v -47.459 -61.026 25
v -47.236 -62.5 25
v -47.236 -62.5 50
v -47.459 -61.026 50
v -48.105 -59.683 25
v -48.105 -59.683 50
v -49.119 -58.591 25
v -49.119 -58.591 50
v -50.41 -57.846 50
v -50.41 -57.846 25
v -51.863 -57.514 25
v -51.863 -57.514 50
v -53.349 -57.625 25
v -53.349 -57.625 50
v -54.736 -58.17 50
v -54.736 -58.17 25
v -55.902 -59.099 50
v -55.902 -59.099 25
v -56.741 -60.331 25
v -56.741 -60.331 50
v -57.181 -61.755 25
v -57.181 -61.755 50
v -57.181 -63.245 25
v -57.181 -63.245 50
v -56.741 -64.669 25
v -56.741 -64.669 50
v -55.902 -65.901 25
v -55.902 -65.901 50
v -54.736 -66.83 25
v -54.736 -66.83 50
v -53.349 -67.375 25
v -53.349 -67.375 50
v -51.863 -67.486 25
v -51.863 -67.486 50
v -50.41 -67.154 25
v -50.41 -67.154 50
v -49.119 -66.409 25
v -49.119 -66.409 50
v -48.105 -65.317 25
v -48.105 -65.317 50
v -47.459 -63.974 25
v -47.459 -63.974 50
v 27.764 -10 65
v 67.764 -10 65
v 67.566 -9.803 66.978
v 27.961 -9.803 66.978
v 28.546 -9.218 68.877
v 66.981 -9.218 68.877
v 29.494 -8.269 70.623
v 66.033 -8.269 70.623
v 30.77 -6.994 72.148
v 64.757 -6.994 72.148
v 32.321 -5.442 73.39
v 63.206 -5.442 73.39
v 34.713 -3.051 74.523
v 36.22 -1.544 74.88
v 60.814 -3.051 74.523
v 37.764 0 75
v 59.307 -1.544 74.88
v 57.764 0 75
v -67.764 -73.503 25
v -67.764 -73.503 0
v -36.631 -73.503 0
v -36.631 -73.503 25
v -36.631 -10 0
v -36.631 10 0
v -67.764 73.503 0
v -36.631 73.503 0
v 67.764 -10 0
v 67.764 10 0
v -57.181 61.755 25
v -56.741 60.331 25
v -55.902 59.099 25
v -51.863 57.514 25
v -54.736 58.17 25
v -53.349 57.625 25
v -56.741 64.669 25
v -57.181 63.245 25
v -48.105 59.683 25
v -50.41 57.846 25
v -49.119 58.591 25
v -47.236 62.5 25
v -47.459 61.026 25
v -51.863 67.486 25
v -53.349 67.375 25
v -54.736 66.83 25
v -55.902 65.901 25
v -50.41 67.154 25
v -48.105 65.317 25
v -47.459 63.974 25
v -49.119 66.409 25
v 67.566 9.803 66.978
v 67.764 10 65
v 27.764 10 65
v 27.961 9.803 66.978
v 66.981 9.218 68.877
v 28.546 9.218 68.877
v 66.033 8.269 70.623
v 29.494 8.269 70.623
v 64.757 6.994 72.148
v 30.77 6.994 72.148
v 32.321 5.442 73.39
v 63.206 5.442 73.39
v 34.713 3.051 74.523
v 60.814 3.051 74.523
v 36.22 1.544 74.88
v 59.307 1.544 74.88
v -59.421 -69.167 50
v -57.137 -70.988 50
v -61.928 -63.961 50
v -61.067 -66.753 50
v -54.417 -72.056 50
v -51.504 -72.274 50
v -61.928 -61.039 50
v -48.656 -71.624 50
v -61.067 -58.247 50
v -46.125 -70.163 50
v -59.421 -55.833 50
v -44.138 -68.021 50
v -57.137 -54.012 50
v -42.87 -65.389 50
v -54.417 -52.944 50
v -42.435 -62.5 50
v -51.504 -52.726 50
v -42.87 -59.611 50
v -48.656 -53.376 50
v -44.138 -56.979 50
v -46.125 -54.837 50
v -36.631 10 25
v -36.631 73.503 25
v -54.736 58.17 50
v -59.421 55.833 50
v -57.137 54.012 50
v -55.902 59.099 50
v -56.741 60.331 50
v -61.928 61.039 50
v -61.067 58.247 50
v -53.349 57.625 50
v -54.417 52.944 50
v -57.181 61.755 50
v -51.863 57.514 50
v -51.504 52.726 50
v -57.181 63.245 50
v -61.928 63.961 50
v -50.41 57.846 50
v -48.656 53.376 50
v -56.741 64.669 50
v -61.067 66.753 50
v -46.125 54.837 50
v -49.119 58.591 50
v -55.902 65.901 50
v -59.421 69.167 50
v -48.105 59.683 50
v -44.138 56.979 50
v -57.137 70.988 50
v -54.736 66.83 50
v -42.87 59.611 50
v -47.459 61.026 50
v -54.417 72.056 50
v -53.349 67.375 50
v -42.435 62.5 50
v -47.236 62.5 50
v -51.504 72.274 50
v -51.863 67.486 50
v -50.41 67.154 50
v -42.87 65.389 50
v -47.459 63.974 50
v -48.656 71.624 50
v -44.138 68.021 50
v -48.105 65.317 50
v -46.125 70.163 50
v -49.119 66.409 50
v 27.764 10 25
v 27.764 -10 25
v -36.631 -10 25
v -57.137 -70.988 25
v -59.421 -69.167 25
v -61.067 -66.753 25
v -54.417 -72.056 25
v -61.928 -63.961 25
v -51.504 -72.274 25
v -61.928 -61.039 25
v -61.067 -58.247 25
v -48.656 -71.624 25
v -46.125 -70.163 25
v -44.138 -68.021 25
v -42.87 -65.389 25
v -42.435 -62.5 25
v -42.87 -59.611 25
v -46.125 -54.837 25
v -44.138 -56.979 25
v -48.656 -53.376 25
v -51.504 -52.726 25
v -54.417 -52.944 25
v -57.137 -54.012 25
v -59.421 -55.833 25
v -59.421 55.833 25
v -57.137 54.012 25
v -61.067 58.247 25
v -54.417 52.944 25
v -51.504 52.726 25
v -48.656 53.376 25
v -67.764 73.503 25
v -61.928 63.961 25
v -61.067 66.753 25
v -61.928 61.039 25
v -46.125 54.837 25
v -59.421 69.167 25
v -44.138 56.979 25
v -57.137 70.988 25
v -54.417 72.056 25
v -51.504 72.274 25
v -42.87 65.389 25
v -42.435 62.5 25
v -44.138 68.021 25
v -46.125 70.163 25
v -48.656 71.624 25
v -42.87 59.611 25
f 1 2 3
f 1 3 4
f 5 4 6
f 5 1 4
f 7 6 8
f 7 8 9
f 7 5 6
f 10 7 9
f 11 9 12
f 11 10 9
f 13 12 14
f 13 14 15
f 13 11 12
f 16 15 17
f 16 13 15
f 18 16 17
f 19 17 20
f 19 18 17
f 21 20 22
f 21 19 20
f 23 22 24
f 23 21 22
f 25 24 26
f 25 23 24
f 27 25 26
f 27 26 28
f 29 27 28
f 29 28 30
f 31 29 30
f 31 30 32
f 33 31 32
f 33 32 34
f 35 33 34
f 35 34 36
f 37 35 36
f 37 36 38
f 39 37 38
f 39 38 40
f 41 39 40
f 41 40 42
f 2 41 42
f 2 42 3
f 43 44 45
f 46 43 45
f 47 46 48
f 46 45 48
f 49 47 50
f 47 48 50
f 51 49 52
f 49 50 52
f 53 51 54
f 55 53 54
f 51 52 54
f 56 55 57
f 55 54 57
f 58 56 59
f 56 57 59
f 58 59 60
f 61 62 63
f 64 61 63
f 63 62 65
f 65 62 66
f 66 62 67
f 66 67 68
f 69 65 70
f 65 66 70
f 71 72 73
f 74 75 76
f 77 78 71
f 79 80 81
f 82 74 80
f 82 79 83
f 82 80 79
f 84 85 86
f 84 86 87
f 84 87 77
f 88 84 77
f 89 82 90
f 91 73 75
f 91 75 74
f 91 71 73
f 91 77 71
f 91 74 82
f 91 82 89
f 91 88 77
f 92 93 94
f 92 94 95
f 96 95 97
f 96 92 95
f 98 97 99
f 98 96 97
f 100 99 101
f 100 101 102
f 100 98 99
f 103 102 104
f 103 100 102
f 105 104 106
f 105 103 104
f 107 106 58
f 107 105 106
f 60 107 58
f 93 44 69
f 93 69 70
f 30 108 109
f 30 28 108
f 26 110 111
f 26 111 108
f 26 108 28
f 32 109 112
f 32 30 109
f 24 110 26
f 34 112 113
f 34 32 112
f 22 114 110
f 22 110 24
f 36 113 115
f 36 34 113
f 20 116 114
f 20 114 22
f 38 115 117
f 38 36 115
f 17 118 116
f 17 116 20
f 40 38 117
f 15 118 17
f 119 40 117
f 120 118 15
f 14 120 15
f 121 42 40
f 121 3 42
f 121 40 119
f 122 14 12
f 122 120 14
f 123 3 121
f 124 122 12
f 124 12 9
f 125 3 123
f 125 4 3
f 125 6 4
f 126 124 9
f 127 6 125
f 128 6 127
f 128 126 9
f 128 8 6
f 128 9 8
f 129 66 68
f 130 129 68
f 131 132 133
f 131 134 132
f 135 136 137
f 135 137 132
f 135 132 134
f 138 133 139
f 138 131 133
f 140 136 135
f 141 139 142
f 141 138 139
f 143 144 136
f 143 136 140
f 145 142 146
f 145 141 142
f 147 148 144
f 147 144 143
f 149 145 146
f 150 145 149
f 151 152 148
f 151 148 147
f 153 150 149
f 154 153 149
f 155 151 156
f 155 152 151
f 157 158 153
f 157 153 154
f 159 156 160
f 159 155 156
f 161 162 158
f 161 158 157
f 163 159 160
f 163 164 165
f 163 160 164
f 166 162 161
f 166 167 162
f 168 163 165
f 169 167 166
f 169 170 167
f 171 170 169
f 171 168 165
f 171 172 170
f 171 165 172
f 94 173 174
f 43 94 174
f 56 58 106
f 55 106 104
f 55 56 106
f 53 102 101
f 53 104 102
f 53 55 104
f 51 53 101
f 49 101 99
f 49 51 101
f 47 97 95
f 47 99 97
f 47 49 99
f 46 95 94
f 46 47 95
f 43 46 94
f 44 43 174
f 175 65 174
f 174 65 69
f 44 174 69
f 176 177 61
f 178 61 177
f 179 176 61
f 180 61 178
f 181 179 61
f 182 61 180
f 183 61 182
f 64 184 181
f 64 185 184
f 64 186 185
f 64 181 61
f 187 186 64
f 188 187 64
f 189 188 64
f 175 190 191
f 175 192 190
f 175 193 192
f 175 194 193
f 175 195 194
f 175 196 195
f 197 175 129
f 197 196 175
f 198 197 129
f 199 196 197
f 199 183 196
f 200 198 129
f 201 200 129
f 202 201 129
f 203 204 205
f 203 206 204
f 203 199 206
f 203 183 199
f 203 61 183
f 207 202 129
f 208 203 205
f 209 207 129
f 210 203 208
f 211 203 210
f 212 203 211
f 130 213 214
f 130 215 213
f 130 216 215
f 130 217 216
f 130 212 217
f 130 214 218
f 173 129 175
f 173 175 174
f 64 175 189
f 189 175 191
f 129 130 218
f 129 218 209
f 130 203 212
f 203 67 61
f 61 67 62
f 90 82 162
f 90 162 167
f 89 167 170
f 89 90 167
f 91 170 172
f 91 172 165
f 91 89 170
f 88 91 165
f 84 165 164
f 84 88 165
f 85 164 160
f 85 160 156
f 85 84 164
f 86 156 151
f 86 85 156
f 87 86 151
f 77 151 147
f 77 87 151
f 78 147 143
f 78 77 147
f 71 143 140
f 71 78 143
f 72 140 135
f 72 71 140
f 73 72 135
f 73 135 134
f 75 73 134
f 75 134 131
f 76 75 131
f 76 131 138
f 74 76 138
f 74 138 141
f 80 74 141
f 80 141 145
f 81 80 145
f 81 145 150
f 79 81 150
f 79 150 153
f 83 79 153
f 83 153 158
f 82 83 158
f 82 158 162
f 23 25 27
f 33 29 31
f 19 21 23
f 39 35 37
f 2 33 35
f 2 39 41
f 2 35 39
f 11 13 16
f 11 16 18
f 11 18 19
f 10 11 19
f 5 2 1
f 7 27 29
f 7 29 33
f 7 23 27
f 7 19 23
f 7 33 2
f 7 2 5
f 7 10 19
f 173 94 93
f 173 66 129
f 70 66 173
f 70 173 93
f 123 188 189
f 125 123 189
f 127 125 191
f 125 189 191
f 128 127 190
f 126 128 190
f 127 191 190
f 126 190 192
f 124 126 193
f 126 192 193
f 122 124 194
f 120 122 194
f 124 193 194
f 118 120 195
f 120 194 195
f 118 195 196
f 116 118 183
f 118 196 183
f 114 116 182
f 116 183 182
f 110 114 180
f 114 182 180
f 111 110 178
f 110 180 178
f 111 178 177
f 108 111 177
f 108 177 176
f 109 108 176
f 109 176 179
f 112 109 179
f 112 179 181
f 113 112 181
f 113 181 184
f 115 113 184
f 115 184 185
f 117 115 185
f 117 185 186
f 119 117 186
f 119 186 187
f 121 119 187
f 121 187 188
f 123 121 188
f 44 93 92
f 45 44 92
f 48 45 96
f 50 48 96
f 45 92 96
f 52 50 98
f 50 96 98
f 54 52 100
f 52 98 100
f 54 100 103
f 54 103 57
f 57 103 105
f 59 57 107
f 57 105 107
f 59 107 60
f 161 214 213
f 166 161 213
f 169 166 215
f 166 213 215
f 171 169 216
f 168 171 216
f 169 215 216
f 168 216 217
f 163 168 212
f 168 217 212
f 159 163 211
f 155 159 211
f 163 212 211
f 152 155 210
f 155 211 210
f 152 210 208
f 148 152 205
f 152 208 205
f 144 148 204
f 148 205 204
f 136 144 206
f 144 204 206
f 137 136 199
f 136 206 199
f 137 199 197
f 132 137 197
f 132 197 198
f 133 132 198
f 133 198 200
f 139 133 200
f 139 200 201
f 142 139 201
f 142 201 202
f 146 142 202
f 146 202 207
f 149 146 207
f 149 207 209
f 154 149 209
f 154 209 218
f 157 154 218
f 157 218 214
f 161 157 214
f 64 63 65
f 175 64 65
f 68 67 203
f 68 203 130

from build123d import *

# Parameters (mm, degrees)
F0_R     = 9.8014094823
F0_R_2   = 5
F1_DEPTH = 50
F0_W     = 31.1324822545
F0_H     = 63.5031664371
F2_DEPTH = 25
F0_W_2   = 40
F0_H_2   = 4.5
F0_H_3   = 5.5
F3_DEPTH = 75
F4_R     = 9.99999
F5_DEPTH = 25


# Not quite as in the source:
# - a fillet or chamfer is up to 0.001 mm smaller than in the source, because OpenCascade refuses the exact size


with BuildPart() as f1:
    # F0 (on Top) → F1 (new body)
    with BuildSketch(Plane.XY):
        with Locations((-52.2364327669, -62.5)):
            Circle(F0_R)
        with Locations((-52.2364327669, -62.5)):
            Circle(F0_R_2, mode=Mode.SUBTRACT)
    extrude(amount=F1_DEPTH)



with BuildPart() as f1b:
    # F0 (on Top) → F1, piece 2 (new body)
    with BuildSketch(Plane.XY):
        with Locations((-52.2364327669, 62.5)):
            Circle(F0_R)
        with Locations((-52.2364327669, 62.5)):
            Circle(F0_R_2, mode=Mode.SUBTRACT)
    extrude(amount=F1_DEPTH)


with BuildPart() as f1_1:
    add(f1.part)

    add(f1b.part)  # F2 merges F1b
    # F0 (on Top) → F2 (join)
    with BuildSketch(Plane.XY):
        with Locations((-52.1973261058, 41.7515832186)):
            Rectangle(F0_W, F0_H)
        with Locations((-52.2364327669, 62.5)):
            Circle(F0_R, mode=Mode.SUBTRACT)
        Polygon((-36.6310849786, -10), (27.7635672331, -10), (27.7635672331, -5.5), (27.7635672331, 0), (27.7635672331, 5.5), (27.7635672331, 10), (-36.6310849786, 10), (-67.7635672331, 10), (-67.7635672331, -10), align=None)
        with Locations((-52.1973261058, -41.7515832186)):
            Rectangle(F0_W, F0_H)
        with Locations((-52.2364327669, -62.5)):
            Circle(F0_R, mode=Mode.SUBTRACT)
    extrude(amount=F2_DEPTH)

    # F0 (on Top) → F3 (join)
    with BuildSketch(Plane.XY):
        with Locations((47.7635672331, -7.75)):
            Rectangle(F0_W_2, F0_H_2)
        with Locations((47.7635672331, -2.75)):
            Rectangle(F0_W_2, F0_H_3)
        with Locations((47.7635672331, 2.75)):
            Rectangle(F0_W_2, F0_H_3)
        with Locations((47.7635672331, 7.75)):
            Rectangle(F0_W_2, F0_H_2)
    extrude(amount=F3_DEPTH)

    # F4 (radius 10 in the source; OpenCascade refuses exactly that, so slightly less here)
    f4_edges = [f1_1.edges().sort_by_distance(p)[0] for p in [
        (47.763567, -10, 75),
        (67.763567, 0, 75),
        (47.763567, 10, 75),
        (27.763567, 0, 75),
    ]]
    fillet(f4_edges, radius=F4_R)

    # F0 (on Top) → F5 (join)
    with BuildSketch(Plane.XY):
        with Locations((-52.2364327669, 62.5)):
            Circle(F0_R_2)
        with Locations((-52.2364327669, -62.5)):
            Circle(F0_R_2)
    extrude(amount=F5_DEPTH)


solid = f1_1.part
